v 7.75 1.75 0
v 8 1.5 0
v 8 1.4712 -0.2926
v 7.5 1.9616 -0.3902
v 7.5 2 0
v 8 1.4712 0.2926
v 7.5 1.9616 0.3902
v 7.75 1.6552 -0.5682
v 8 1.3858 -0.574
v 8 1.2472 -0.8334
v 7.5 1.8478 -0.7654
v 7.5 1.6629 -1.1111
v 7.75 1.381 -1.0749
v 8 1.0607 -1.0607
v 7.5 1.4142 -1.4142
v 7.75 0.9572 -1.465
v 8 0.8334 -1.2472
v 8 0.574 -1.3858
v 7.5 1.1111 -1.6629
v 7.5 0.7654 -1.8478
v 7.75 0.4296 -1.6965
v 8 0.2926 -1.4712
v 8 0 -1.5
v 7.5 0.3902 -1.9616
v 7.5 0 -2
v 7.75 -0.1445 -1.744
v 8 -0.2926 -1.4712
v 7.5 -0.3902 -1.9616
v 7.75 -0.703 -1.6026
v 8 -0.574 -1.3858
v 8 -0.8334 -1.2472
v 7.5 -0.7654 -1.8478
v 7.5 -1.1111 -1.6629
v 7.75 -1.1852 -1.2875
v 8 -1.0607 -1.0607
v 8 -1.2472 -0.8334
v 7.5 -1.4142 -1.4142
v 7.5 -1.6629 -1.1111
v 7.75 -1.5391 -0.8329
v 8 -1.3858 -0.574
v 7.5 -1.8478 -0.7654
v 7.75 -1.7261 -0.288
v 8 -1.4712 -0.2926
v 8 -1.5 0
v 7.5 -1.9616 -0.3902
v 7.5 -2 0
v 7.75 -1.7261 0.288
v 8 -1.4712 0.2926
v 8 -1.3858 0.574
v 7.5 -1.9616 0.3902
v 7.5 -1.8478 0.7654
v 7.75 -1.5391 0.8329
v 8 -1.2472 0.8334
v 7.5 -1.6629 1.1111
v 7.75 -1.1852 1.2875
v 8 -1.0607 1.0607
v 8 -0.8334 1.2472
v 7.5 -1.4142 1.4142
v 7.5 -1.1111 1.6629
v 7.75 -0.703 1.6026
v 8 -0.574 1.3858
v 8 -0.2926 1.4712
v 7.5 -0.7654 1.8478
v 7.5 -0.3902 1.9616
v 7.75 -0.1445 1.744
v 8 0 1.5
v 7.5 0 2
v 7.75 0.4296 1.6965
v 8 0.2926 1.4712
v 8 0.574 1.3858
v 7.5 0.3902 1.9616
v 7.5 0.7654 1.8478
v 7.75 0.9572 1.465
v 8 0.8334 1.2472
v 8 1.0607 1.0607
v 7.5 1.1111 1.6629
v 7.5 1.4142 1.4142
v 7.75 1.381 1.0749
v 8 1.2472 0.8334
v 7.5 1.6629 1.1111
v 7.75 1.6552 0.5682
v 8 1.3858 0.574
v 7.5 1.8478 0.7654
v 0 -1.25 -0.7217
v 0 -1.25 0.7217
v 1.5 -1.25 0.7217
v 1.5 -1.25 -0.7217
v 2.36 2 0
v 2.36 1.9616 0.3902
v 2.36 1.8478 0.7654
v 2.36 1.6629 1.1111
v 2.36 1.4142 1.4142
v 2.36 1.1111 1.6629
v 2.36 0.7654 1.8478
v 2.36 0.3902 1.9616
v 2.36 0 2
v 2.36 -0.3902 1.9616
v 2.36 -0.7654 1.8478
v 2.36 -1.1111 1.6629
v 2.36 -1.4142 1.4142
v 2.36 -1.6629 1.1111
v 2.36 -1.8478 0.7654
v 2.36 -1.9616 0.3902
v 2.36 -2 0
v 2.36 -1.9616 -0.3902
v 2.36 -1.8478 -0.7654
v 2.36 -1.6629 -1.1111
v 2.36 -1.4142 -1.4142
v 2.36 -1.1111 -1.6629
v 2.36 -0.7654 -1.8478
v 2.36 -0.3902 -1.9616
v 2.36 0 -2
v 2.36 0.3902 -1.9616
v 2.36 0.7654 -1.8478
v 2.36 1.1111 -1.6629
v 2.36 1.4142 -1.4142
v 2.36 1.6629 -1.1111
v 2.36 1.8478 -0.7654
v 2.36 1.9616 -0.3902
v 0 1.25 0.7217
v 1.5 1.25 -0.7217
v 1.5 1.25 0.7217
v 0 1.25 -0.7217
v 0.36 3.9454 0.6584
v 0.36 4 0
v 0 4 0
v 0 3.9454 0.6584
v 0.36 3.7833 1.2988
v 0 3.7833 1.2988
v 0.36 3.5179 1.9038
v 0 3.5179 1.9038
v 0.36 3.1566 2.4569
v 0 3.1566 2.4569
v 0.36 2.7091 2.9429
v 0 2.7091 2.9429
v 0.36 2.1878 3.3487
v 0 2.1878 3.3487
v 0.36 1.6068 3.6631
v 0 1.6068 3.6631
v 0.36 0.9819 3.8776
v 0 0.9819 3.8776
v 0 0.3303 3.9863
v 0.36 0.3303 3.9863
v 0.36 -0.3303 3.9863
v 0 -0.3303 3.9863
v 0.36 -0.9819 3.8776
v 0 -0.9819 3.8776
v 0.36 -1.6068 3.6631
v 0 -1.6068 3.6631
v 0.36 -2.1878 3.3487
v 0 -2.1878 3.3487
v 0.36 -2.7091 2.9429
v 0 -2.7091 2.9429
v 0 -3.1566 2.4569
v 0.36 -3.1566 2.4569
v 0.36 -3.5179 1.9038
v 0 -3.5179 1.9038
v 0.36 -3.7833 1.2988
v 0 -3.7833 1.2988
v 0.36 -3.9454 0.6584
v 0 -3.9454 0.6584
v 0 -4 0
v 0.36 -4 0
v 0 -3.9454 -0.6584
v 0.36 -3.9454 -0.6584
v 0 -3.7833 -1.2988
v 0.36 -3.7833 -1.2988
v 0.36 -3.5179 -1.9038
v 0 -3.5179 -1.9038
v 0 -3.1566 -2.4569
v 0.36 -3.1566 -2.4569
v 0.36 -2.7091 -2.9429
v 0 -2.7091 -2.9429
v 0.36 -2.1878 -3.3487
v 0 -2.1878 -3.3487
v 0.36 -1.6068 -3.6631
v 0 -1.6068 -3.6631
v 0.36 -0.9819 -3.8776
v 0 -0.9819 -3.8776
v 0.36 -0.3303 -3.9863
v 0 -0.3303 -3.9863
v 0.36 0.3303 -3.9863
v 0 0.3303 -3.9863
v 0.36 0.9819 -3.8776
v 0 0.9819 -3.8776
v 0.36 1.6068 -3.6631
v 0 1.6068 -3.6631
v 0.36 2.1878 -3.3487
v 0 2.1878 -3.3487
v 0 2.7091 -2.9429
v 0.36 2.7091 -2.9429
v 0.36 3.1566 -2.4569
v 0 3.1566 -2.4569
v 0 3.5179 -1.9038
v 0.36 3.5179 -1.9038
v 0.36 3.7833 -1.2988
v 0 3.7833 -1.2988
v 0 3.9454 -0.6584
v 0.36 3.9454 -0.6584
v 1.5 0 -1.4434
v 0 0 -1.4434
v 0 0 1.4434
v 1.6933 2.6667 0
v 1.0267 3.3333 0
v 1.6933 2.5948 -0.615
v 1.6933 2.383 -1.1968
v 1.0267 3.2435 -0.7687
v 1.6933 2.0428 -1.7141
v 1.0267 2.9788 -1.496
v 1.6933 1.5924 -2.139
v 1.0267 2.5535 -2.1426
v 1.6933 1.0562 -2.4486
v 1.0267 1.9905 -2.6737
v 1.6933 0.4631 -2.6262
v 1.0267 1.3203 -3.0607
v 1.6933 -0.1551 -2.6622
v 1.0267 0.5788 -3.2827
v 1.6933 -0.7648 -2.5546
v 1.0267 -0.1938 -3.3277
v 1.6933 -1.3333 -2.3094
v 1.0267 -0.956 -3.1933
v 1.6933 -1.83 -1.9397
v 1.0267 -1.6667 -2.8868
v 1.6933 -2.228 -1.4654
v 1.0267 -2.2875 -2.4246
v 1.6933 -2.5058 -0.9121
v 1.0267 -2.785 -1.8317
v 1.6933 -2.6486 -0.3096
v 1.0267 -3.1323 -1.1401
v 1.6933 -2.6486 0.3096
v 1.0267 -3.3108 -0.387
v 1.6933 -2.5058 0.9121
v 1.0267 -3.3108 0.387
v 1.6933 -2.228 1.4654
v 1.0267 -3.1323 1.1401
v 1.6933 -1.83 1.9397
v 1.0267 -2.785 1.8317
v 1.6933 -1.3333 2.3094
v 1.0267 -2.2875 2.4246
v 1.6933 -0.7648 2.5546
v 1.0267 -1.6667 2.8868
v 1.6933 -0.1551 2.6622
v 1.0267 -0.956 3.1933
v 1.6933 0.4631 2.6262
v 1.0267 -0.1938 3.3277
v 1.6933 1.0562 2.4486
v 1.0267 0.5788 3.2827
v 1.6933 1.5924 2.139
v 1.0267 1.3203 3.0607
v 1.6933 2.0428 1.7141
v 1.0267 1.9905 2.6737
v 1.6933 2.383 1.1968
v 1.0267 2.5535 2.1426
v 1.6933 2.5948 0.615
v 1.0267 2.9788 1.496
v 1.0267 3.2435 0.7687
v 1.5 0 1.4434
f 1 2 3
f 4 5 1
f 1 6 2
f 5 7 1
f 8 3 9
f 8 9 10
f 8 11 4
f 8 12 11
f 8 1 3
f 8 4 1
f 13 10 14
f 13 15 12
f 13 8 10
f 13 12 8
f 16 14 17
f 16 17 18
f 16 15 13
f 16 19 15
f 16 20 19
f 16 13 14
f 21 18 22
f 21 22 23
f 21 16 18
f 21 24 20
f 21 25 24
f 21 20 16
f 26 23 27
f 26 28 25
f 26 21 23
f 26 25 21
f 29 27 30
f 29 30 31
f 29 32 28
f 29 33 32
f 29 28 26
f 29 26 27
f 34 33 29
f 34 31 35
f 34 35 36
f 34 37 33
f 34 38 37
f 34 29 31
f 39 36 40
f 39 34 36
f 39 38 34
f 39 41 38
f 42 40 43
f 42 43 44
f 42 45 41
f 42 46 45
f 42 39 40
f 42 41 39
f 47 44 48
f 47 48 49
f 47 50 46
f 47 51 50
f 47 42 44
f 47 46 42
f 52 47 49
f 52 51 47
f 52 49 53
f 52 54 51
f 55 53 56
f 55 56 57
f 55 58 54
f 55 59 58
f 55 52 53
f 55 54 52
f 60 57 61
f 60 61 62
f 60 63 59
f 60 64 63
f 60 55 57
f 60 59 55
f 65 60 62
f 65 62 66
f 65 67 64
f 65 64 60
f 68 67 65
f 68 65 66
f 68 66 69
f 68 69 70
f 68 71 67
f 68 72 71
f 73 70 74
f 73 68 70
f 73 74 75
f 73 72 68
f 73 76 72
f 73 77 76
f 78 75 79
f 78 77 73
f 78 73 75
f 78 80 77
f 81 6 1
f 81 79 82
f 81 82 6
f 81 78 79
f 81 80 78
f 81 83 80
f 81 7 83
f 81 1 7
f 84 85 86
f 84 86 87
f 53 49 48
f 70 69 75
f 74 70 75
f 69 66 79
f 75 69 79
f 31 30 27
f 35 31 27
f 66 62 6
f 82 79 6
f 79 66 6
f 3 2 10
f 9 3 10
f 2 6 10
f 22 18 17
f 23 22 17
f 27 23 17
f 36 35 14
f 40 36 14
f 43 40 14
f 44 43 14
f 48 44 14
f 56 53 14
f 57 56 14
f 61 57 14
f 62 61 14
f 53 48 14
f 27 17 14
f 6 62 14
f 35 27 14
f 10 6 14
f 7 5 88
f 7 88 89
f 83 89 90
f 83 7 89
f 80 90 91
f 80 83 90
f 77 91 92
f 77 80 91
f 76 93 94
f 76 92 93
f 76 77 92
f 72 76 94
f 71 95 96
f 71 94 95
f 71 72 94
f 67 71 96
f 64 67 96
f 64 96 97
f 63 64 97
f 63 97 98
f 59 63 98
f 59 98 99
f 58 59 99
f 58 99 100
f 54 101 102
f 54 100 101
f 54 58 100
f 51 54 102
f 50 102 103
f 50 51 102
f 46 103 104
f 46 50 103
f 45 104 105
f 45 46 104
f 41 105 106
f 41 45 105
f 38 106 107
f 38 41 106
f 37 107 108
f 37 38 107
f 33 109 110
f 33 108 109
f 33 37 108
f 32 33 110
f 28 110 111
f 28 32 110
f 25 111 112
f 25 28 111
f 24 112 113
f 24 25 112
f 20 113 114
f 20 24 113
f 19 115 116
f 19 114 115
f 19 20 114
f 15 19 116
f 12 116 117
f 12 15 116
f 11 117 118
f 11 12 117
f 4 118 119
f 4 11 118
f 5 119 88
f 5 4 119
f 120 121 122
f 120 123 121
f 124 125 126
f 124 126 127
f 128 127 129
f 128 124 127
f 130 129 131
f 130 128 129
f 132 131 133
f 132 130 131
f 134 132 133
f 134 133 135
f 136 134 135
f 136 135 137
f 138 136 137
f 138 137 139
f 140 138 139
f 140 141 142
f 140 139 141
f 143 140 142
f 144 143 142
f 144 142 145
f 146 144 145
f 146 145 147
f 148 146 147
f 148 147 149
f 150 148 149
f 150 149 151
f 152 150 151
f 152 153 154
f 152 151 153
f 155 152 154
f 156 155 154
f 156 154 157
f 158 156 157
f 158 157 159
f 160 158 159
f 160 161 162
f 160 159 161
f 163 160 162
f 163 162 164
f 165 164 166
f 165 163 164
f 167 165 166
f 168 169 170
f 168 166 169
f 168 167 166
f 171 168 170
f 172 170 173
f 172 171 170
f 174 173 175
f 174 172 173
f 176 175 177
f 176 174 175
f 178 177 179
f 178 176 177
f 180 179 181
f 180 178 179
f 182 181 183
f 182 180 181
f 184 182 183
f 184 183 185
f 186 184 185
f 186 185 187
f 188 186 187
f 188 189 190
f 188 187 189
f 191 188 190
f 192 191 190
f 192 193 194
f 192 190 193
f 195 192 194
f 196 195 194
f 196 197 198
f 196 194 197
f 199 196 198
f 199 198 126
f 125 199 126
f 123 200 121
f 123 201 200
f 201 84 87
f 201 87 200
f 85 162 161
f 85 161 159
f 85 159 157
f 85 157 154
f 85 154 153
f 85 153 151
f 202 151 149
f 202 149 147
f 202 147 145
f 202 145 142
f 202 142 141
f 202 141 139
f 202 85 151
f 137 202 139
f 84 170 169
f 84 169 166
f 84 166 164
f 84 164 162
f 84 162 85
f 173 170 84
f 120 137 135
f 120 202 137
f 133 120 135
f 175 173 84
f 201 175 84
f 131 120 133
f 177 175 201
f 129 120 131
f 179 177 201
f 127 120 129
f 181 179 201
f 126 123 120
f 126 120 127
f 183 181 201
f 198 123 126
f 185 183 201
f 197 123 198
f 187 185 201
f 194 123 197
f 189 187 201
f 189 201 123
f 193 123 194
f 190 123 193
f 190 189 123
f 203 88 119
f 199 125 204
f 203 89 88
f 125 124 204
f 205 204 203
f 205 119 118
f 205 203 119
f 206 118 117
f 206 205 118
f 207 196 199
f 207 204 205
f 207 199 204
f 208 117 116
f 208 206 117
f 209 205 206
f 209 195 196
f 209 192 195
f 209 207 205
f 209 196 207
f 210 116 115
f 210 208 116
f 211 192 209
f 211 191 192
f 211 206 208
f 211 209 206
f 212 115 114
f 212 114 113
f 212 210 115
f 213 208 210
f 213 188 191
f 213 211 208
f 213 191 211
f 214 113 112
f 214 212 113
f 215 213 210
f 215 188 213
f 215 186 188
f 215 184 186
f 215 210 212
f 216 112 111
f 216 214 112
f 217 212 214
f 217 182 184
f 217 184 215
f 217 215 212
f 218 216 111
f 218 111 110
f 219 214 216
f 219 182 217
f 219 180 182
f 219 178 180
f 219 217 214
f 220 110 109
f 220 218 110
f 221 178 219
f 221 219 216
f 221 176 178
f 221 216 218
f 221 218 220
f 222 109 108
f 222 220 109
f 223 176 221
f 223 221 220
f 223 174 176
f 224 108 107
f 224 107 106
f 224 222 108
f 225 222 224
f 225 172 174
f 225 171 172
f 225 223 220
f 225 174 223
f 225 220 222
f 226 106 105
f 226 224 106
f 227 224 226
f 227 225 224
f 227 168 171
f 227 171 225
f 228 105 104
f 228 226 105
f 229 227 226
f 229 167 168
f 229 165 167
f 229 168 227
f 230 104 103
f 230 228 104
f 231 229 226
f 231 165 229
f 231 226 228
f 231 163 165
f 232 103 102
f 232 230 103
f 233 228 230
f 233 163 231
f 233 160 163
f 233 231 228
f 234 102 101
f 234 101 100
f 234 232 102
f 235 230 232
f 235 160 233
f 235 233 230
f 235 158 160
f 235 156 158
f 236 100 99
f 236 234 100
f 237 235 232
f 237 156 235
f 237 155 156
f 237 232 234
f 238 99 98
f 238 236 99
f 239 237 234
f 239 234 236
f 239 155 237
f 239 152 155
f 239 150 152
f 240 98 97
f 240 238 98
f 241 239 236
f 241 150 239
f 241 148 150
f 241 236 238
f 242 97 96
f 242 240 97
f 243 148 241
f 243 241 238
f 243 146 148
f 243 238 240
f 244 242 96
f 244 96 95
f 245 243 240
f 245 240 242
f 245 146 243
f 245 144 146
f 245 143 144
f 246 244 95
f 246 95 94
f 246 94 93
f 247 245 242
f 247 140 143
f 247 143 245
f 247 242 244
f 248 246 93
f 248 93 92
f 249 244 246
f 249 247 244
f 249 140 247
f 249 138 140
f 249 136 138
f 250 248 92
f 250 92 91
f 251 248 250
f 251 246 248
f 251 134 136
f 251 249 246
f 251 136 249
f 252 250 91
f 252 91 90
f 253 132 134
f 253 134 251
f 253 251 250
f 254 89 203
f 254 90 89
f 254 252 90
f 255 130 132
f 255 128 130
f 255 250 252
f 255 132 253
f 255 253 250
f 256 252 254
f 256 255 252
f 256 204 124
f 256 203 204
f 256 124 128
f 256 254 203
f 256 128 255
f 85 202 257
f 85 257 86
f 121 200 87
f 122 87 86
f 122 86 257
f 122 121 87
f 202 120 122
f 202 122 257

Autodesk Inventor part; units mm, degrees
ref_plane "YZ Plane" through (0, 0, 0) normal (1, 0, 0) x (0, 1, 0)
ref_plane "XZ Plane" through (0, 0, 0) normal (0, 1, 0) x (-1, 0, 0)
ref_plane "XY Plane" through (0, 0, 0) normal (0, 0, 1) x (1, 0, 0)
sketch "Sketch1" plane through (0, 0, 0) normal (0, 0, 1) x (1, 0, 0)
  line L0 (0, 0) -> (0, 4)
  line L1 (0, 4) -> (0.36, 4)
  line L2 (0.36, 4) -> (2.36, 2)
  line L3 (2.36, 2) -> (8, 2)
  line L4 (8, 2) -> (8, 0)
  line L5 (8, 0) -> (0, 0)
  dimension "d0" = 4
  dimension "d1" = 0.36
  dimension "d2" = 135
  dimension "d3" = 8
  dimension "d4" = 2
revolve "Revolution1" add sketch "Sketch1" angle 360 about axis through (8, 0, 0) along (-1, 0, 0)
chamfer "Chamfer1" distance 0.5 angle 45 1 edges at (8, -2, 0)
sketch "Sketch2" plane through (0, 0, 0) normal (-1, 0, 0) x (0, 0, 1)
  circle A0 centre (0, 0) radius 4 projected
  line L0 (-1.4434, 0) -> (-0.7217, 1.25)
  line L1 (-0.7217, 1.25) -> (0.7217, 1.25)
  line L2 (0.7217, 1.25) -> (1.4434, 0)
  line L3 (1.4434, 0) -> (0.7217, -1.25)
  line L4 (0.7217, -1.25) -> (-0.7217, -1.25)
  line L5 (-0.7217, -1.25) -> (-1.4434, 0)
  dimension "d9" = 2.5
extrude "Extrusion1" cut sketch "Sketch2" against normal blind 1.5 contours L0 L1 L2 L3 L4 L5
thread "Thread1" size "M4x0.7" class "6g" standard "ANSI Metric M Profile" full length
properties part number "FHS4x8" material "Steel, Alloy"
